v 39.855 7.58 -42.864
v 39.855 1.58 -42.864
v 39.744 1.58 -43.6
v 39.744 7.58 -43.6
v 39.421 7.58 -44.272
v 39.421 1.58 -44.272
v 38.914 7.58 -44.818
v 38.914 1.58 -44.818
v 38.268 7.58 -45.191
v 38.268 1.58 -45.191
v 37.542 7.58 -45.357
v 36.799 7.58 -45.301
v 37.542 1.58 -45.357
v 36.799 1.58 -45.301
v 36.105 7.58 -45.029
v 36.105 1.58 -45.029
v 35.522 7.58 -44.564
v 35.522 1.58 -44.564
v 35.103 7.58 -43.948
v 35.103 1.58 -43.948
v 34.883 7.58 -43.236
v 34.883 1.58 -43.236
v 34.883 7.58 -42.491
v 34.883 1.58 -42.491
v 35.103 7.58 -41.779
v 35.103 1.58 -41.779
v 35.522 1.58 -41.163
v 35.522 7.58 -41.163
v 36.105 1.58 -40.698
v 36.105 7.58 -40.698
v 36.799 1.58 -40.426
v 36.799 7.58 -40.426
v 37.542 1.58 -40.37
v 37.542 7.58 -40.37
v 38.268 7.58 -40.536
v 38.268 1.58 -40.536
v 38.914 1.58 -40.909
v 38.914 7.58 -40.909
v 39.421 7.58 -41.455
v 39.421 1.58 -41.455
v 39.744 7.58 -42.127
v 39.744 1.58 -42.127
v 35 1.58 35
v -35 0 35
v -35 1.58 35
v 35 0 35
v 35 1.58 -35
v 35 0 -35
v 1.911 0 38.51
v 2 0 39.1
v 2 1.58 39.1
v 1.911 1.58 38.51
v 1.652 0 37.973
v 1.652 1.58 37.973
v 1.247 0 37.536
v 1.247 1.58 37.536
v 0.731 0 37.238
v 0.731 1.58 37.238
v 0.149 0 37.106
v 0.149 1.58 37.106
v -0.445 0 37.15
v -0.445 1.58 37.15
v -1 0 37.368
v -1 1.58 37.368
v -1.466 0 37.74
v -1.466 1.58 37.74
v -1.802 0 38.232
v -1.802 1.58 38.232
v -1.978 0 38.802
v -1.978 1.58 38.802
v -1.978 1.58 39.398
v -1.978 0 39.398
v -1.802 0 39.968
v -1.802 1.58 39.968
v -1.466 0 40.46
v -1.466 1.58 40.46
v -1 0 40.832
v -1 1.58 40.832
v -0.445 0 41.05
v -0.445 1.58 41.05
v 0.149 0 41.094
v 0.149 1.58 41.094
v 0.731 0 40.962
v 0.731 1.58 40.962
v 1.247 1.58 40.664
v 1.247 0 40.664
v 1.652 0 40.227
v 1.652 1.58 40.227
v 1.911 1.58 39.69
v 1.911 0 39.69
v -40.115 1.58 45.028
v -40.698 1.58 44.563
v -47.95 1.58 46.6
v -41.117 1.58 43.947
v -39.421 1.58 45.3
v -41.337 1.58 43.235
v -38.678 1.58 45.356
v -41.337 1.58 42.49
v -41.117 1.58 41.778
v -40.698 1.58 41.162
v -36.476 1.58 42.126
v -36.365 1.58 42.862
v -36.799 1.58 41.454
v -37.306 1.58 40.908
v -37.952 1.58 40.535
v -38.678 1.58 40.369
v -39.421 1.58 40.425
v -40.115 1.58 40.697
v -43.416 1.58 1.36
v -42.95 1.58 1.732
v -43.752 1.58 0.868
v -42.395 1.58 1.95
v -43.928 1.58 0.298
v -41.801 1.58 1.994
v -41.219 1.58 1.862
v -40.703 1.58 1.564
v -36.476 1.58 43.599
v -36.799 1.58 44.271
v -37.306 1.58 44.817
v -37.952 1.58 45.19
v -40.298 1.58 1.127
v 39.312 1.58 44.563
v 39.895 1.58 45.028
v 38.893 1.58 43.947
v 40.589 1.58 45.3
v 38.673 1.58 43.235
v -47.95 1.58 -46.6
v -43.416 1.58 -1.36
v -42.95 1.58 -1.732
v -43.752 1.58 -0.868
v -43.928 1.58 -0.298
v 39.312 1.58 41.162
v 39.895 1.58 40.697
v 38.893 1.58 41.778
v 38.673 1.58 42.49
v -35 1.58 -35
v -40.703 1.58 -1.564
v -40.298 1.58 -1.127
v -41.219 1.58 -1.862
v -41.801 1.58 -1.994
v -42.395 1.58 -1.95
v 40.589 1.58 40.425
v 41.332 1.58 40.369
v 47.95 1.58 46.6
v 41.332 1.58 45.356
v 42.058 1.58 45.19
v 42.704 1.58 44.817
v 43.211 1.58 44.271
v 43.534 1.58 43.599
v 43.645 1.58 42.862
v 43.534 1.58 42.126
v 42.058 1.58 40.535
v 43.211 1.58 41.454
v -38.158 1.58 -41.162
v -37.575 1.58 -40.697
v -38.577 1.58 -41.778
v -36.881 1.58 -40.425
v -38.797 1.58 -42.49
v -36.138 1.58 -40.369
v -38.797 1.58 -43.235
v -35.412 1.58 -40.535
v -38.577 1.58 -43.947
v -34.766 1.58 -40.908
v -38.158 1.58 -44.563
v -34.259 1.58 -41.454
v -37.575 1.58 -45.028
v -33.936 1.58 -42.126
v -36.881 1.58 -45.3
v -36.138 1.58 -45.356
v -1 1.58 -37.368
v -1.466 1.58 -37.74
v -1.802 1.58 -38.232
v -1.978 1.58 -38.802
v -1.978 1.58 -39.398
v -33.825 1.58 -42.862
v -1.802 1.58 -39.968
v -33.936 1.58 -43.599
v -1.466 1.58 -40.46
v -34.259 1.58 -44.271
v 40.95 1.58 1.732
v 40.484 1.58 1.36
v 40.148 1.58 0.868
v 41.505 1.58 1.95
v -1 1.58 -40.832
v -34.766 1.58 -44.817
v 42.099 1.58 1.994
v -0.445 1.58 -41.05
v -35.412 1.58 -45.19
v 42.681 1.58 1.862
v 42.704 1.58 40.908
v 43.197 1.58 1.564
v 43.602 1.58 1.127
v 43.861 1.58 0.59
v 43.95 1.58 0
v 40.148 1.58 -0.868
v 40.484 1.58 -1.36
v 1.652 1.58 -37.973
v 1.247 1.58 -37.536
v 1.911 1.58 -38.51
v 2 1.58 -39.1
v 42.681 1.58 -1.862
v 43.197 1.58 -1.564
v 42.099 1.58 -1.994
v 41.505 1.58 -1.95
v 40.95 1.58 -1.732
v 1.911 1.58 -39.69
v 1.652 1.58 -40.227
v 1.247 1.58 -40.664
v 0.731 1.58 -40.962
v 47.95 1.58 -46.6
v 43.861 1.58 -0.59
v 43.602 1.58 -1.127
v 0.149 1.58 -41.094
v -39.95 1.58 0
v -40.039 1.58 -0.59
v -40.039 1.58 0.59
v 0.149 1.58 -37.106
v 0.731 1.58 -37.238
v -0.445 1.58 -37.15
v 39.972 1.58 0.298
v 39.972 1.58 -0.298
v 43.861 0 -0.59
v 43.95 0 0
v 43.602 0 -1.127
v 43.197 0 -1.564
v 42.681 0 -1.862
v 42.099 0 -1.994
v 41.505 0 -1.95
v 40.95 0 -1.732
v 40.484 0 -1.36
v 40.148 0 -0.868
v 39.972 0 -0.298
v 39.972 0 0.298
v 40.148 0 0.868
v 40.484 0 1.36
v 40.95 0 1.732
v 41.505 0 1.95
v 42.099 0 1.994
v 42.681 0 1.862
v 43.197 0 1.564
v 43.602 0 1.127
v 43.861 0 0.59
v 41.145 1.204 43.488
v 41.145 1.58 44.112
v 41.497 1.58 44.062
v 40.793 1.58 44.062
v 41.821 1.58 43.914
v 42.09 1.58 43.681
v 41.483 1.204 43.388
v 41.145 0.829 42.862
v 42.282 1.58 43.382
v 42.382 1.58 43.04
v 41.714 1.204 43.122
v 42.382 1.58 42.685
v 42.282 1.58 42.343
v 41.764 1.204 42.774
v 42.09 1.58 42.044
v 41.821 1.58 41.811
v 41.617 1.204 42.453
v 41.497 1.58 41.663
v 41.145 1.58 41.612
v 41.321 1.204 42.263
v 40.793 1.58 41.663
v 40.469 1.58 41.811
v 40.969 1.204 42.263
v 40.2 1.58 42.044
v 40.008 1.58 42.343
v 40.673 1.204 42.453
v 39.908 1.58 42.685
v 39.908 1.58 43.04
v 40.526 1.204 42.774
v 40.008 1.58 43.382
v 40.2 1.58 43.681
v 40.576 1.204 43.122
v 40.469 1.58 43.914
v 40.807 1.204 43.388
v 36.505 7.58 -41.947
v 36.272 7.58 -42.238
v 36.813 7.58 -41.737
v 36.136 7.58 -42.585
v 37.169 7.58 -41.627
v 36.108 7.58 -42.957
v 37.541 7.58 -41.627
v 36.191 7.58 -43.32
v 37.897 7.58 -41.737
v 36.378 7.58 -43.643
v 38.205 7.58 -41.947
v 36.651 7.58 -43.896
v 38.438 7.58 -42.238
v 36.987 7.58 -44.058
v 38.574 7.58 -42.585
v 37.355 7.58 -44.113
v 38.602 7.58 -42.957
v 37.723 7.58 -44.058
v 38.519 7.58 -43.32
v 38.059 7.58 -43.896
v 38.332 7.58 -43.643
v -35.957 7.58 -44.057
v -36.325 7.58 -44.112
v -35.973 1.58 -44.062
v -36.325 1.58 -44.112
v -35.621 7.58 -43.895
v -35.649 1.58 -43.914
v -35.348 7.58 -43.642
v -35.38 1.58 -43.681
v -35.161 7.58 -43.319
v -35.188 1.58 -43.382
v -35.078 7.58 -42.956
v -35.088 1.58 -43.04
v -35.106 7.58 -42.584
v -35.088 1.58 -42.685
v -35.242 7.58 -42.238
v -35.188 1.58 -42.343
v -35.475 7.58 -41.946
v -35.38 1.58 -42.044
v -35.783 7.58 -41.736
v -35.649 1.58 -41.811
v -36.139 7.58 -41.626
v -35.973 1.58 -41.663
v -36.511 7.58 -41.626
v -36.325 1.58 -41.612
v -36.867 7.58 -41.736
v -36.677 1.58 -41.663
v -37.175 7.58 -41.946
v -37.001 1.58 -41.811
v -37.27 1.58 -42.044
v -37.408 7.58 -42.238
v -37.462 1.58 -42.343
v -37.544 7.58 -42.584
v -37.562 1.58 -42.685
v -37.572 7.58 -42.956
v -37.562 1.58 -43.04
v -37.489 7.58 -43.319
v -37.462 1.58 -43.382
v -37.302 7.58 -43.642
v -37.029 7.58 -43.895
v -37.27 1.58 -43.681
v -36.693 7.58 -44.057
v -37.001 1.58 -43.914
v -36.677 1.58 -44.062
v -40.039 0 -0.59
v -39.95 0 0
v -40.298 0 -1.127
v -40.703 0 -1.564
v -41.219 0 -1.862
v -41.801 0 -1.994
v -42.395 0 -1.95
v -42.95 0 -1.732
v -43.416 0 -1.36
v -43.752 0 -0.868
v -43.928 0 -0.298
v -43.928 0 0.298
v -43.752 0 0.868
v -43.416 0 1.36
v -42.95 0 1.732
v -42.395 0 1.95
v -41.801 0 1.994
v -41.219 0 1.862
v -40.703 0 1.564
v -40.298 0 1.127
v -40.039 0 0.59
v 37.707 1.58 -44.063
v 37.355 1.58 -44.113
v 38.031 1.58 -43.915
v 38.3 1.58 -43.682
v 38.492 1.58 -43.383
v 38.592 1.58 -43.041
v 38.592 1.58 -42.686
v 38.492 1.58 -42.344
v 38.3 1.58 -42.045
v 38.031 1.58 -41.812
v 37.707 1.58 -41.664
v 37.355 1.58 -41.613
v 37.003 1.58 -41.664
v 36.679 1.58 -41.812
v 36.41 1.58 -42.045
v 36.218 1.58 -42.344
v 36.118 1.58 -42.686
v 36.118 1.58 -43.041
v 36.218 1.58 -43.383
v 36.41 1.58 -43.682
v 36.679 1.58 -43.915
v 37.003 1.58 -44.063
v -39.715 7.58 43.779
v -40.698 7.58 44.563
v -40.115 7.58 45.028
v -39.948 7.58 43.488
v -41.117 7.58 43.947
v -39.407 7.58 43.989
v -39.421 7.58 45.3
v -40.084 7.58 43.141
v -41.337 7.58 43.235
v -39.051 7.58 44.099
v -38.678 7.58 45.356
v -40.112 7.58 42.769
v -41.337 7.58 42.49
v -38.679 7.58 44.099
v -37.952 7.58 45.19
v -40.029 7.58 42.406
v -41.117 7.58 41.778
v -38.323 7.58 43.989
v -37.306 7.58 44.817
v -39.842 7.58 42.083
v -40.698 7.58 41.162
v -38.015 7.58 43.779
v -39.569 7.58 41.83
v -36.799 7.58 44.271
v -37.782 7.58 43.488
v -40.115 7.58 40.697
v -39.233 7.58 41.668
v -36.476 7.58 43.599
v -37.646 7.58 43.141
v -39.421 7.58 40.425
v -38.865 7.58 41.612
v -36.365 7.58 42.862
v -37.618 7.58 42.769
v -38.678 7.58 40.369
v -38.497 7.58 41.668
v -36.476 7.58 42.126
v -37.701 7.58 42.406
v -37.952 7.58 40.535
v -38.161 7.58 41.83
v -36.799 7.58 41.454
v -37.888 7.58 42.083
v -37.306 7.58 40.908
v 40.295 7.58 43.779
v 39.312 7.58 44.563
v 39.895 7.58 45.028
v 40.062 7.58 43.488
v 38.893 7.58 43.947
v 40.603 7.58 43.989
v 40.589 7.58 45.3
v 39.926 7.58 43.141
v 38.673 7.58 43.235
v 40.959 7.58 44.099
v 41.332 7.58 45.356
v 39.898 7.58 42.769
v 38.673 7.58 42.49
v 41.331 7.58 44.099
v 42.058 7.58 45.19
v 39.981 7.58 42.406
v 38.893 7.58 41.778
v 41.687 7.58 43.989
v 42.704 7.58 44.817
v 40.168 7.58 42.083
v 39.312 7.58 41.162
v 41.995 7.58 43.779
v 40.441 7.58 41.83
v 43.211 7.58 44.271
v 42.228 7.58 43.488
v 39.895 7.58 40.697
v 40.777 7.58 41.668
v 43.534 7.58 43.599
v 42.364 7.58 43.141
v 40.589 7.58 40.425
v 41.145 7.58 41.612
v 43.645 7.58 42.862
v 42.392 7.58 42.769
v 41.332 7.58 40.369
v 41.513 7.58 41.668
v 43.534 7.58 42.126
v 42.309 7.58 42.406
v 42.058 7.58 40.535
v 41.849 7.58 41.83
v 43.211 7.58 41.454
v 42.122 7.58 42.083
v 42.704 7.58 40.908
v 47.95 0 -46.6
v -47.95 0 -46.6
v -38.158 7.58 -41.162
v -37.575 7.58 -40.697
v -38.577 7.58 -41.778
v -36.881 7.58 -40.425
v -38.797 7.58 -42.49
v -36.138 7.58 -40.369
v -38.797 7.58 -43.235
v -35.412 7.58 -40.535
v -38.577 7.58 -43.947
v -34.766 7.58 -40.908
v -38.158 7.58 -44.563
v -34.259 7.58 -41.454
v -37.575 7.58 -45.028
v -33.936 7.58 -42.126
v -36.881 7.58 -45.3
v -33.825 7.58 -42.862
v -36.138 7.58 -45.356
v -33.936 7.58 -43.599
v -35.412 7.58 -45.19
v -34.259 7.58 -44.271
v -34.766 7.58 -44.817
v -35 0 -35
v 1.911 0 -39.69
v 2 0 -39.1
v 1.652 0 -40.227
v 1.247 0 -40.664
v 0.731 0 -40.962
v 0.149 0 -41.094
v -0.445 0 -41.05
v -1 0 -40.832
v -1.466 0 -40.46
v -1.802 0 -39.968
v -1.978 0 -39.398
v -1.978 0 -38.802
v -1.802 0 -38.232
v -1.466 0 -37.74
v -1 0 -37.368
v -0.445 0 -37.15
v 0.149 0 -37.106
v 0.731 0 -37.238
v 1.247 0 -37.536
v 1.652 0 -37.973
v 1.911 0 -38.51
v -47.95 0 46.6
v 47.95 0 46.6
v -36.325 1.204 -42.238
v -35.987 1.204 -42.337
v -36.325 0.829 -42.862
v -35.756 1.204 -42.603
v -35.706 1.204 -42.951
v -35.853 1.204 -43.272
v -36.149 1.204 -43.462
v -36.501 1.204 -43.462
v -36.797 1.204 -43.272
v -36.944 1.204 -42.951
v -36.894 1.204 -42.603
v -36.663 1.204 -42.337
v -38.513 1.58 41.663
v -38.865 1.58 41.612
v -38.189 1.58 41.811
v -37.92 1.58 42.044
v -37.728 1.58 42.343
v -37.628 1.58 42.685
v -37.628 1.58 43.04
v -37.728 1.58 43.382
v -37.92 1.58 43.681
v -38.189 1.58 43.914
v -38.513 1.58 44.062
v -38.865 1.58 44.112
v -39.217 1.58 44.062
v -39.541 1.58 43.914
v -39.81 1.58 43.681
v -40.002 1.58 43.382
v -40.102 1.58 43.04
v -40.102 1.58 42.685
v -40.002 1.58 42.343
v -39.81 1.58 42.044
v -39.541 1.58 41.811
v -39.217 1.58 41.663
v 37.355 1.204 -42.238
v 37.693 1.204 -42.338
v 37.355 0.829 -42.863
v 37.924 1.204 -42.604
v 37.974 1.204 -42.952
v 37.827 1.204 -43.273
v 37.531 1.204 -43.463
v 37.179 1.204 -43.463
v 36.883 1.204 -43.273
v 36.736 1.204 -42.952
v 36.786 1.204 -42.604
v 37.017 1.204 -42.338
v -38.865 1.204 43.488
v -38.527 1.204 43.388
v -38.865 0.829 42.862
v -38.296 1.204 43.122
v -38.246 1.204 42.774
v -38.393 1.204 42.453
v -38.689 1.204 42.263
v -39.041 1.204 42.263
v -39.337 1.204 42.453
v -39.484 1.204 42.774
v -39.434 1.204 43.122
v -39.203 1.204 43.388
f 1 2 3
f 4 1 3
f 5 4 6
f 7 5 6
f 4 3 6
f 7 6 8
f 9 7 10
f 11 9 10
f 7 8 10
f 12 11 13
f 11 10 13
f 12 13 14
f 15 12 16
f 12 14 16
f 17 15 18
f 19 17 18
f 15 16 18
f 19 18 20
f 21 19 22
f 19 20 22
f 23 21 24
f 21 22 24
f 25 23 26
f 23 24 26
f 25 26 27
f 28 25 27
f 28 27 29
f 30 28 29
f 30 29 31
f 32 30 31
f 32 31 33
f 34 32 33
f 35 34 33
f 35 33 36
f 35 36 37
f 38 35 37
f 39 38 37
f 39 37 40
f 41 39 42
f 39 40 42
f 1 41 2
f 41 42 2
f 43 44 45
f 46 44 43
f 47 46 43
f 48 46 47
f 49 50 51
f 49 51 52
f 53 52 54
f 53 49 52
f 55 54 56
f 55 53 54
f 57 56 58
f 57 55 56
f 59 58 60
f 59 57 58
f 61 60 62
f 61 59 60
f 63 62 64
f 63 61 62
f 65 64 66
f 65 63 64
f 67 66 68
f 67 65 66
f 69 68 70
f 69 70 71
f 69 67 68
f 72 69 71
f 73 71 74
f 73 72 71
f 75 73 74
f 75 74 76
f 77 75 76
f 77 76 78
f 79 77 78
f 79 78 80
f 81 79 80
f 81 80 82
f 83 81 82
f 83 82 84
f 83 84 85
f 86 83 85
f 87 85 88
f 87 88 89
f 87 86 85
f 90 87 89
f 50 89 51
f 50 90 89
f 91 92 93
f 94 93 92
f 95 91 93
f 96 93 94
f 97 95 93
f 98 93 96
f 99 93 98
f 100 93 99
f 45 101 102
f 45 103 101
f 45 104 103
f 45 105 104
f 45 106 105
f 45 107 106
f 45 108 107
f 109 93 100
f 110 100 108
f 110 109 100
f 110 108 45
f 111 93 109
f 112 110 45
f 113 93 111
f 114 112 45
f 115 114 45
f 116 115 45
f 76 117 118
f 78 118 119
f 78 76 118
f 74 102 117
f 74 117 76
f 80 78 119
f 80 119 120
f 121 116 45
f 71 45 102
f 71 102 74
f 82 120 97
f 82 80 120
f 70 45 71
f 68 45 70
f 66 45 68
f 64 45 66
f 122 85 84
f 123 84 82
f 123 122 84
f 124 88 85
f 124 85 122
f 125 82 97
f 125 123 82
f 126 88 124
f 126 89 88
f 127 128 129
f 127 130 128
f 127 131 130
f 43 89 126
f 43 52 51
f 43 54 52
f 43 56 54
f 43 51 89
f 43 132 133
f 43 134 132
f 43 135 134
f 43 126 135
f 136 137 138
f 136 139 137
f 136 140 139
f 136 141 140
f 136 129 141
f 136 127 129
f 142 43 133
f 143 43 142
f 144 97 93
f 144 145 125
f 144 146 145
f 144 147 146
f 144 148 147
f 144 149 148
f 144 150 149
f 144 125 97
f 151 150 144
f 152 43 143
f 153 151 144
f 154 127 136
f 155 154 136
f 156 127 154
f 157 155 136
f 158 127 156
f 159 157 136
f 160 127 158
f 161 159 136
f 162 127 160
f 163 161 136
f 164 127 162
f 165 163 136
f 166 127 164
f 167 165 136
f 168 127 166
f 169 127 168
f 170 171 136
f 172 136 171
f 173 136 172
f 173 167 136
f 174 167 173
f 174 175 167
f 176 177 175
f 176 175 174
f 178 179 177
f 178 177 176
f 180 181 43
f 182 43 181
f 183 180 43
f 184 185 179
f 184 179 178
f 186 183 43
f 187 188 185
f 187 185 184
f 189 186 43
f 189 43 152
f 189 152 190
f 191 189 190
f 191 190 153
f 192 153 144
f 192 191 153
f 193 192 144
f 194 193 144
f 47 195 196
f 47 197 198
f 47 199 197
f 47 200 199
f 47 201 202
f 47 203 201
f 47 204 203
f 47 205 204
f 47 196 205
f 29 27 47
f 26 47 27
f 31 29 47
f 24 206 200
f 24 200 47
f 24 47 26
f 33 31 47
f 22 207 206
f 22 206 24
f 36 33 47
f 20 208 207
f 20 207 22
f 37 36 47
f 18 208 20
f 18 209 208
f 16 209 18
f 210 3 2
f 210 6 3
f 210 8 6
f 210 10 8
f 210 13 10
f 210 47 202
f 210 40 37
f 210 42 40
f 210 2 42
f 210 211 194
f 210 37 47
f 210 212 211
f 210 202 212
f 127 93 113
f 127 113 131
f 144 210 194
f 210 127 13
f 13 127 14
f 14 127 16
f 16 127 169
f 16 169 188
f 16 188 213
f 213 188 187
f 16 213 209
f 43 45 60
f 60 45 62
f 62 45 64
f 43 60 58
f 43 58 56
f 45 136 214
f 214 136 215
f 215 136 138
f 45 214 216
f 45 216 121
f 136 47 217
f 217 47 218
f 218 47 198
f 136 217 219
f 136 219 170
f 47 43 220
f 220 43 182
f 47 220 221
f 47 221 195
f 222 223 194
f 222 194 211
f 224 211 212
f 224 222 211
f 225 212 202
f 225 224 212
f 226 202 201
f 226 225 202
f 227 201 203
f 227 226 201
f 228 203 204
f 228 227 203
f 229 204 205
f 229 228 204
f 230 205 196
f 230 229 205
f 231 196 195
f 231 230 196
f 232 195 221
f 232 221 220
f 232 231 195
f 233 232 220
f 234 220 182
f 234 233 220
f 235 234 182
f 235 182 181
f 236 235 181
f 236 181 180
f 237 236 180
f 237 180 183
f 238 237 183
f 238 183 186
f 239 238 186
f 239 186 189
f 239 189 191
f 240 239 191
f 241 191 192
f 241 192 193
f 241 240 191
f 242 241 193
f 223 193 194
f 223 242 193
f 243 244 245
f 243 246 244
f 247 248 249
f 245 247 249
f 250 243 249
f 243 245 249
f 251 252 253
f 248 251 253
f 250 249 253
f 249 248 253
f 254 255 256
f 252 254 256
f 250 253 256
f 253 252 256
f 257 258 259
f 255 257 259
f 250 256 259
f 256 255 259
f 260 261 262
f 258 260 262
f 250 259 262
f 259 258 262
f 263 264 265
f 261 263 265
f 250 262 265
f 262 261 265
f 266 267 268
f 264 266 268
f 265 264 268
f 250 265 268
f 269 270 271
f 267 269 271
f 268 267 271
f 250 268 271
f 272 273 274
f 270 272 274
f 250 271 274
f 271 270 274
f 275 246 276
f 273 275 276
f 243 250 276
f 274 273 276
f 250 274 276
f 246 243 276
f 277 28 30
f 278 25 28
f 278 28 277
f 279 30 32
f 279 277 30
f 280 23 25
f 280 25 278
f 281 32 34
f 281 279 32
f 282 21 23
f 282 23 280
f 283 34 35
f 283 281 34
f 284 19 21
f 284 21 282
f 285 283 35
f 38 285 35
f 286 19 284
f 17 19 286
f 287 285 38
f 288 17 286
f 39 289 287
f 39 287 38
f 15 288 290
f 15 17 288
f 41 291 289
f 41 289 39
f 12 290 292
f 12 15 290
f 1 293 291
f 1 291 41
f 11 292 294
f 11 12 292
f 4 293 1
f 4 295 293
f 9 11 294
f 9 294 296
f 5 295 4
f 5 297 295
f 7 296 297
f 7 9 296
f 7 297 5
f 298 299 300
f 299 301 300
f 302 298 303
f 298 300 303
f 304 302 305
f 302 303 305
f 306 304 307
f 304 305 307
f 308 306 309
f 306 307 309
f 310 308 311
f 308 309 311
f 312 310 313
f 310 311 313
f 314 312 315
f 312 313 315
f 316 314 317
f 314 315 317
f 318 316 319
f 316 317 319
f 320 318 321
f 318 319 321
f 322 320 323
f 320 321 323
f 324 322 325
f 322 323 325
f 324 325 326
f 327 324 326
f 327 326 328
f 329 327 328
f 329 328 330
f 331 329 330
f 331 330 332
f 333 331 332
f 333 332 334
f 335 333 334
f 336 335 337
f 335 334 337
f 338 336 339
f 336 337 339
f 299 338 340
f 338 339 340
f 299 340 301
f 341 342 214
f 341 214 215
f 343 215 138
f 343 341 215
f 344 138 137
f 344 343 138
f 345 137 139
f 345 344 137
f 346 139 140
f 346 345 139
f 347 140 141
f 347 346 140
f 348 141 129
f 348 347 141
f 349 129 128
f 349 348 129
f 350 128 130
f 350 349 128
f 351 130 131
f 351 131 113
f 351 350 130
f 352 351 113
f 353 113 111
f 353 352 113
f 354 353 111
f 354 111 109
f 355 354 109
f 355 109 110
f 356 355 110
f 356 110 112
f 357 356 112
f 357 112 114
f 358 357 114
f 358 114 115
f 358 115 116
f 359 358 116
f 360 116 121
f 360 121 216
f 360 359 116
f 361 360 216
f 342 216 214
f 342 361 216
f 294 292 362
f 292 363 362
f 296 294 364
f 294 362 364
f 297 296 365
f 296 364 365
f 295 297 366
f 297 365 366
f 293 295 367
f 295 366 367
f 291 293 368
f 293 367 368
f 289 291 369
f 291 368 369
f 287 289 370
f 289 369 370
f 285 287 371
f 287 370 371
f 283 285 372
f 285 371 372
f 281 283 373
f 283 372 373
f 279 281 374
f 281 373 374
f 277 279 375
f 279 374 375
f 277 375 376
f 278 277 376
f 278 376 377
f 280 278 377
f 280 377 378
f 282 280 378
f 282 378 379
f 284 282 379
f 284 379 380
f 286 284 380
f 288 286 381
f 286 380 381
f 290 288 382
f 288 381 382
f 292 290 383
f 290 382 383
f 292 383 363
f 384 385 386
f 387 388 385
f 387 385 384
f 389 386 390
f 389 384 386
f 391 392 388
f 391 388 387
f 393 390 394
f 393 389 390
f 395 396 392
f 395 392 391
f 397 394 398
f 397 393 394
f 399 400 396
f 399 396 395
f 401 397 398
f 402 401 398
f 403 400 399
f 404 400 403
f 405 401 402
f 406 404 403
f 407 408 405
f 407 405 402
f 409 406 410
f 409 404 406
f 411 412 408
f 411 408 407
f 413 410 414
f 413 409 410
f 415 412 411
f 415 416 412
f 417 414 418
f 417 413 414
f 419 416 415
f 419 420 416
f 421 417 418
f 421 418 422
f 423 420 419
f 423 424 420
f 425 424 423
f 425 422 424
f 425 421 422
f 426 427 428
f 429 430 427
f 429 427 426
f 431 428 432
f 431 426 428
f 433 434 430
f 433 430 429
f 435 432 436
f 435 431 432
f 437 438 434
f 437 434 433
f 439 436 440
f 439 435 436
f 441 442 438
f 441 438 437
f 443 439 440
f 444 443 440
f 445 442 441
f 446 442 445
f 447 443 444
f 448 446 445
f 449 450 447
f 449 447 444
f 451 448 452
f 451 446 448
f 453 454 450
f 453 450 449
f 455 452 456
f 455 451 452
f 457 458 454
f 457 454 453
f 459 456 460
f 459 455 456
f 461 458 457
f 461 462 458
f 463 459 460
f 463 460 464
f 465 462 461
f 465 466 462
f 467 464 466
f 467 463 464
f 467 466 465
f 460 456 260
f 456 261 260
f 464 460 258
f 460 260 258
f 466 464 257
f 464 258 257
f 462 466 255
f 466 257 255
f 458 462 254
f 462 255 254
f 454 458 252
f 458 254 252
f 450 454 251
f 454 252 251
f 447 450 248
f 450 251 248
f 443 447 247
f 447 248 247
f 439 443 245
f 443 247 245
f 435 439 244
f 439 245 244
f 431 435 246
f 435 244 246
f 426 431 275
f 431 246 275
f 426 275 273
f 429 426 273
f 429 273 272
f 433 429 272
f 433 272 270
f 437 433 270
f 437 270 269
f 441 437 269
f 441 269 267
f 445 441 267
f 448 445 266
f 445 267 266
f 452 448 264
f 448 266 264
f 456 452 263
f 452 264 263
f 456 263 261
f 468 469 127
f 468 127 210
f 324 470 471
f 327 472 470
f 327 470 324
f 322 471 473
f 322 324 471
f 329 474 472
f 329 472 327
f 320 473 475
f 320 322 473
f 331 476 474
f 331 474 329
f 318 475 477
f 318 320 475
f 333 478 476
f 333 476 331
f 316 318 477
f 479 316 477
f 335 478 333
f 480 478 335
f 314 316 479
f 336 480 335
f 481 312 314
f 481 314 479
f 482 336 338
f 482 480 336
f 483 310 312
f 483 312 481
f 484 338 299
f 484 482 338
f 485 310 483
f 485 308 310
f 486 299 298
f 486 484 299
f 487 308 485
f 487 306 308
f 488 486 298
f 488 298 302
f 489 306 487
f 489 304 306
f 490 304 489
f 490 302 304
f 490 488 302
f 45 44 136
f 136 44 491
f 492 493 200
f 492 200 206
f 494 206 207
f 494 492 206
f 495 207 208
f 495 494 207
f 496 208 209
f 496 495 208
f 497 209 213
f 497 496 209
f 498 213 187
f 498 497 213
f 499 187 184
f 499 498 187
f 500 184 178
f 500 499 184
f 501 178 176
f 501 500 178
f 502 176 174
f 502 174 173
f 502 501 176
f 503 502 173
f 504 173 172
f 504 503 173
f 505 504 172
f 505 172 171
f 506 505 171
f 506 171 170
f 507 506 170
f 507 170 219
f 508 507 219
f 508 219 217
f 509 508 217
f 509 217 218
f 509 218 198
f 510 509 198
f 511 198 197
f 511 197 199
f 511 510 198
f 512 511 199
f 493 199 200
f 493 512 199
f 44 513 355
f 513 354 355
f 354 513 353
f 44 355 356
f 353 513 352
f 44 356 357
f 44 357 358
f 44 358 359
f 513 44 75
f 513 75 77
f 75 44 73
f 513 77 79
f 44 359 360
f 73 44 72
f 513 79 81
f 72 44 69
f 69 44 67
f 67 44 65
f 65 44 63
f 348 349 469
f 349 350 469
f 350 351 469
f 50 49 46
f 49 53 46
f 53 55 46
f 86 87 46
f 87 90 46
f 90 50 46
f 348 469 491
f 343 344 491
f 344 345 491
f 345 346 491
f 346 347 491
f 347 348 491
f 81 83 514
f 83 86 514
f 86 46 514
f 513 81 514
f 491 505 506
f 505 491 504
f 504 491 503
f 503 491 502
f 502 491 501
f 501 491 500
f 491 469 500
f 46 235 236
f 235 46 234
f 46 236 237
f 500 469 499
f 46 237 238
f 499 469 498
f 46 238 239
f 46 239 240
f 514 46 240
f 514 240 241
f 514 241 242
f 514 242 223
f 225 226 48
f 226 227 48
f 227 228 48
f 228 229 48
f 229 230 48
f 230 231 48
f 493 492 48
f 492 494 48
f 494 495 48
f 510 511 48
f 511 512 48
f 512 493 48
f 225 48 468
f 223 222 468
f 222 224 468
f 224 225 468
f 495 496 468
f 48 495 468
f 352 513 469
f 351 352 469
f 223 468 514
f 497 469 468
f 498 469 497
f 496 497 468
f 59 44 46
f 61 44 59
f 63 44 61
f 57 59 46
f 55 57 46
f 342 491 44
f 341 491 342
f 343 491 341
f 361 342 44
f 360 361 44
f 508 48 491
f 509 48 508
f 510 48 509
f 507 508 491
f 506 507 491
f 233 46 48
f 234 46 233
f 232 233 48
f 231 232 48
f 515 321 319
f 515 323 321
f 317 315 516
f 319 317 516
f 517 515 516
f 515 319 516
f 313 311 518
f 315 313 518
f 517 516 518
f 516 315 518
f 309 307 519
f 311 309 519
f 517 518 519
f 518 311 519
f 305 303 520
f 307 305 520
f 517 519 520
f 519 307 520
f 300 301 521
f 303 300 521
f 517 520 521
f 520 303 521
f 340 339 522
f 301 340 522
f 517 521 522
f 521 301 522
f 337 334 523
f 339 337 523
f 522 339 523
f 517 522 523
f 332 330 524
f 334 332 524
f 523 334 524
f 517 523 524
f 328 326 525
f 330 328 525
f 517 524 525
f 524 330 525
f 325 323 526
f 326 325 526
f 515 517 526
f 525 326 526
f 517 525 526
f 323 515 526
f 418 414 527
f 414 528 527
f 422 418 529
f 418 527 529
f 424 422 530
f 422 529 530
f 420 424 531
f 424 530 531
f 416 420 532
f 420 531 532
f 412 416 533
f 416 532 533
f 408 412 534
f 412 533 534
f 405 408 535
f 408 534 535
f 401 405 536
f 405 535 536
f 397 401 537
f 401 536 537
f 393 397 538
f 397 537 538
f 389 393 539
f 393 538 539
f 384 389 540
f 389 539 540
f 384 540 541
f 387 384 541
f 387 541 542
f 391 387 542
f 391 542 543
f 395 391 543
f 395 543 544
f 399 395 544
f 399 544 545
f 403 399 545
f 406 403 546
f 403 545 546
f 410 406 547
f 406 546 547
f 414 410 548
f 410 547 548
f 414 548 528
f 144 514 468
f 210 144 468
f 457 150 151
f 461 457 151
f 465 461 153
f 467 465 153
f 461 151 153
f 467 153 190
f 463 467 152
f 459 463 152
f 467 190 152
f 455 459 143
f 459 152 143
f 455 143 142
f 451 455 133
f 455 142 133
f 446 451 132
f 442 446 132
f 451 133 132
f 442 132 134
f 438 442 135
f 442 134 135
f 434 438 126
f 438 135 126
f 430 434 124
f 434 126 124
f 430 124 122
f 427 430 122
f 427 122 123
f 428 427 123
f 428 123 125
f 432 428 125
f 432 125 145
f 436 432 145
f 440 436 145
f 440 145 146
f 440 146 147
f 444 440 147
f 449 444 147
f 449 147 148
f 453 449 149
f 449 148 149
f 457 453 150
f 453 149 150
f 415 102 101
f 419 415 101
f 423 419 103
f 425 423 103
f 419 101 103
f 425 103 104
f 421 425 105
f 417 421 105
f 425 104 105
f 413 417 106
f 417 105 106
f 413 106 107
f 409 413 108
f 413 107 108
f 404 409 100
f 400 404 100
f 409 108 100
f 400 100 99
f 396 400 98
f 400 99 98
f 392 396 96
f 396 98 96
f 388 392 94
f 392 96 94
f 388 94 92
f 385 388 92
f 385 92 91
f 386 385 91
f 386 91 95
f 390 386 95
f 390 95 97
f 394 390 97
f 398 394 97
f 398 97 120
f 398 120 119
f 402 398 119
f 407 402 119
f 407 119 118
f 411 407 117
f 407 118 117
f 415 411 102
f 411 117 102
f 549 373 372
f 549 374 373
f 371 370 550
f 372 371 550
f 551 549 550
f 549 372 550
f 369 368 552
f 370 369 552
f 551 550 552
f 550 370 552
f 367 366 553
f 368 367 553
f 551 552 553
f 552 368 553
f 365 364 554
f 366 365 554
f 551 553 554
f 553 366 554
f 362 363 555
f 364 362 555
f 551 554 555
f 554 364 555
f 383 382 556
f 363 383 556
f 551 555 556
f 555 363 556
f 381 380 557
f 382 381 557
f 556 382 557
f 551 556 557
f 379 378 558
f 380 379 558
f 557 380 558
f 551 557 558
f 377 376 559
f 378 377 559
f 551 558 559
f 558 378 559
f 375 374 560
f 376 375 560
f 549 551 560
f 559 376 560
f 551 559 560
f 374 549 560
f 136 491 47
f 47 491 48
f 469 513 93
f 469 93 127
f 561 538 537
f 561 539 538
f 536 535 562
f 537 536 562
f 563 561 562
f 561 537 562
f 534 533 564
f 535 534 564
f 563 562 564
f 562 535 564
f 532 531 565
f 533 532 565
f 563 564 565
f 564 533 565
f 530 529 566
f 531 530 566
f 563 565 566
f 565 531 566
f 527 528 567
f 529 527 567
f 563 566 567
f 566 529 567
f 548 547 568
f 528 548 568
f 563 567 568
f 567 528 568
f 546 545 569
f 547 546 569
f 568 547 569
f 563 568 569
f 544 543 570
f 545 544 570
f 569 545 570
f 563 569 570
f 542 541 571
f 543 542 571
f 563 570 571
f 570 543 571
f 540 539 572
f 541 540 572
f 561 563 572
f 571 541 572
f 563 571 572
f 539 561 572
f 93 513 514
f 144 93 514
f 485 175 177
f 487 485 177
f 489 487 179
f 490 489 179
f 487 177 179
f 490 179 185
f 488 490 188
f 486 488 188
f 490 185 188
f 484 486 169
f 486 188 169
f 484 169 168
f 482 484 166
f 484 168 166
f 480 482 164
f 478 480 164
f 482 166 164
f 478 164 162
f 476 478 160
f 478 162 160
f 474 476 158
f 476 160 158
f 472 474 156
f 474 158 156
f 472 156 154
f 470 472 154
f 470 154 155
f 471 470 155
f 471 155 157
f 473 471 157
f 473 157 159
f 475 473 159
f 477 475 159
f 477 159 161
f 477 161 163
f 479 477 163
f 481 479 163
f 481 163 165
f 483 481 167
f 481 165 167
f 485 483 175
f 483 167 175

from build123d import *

# Parameters (mm, degrees)
SKETCH1_W                 = 95.9
SKETCH1_H                 = 93.2
SKETCH1_R                 = 2
SKETCH1_W_2               = 70
SKETCH1_H_2               = 70
BOSS_EXTRUDE1_DEPTH       = 1.58
SKETCH2_R                 = 2.5
BOSS_EXTRUDE2_DEPTH       = 6
M3X0_5_TAPPED_HOLE2_D     = 2.5
M3X0_5_TAPPED_HOLE2_DEPTH = 6
M3X0_5_TAPPED_HOLE2_TIP   = 0.751075774


with BuildPart() as part:
    # Sketch1 → Boss-Extrude1 (new body)
    with BuildSketch(Plane(origin=(0, 0, 0), x_dir=(1, 0, 0), z_dir=(0, 1, 0))):
        Rectangle(SKETCH1_W, SKETCH1_H)
        with Locations((0, 39.1)):
            Circle(SKETCH1_R, mode=Mode.SUBTRACT)
        with Locations((41.95, 0)):
            Circle(SKETCH1_R, mode=Mode.SUBTRACT)
        with Locations((0, -39.1)):
            Circle(SKETCH1_R, mode=Mode.SUBTRACT)
        with Locations((-41.95, 0)):
            Circle(SKETCH1_R, mode=Mode.SUBTRACT)
        Rectangle(SKETCH1_W_2, SKETCH1_H_2, mode=Mode.SUBTRACT)
    extrude(amount=BOSS_EXTRUDE1_DEPTH)

    # Sketch2 → Boss-Extrude2 (add)
    with BuildSketch(Plane(origin=(0, 1.58, 0), x_dir=(1, 0, 0), z_dir=(0, 1, 0))):
        with Locations((37.355, 42.8635)):
            Circle(SKETCH2_R)
        with Locations((-36.325, 42.8625)):
            Circle(SKETCH2_R)
        with Locations((-38.865, -42.8625)):
            Circle(SKETCH2_R)
        with Locations((41.145, -42.8625)):
            Circle(SKETCH2_R)
    extrude(amount=BOSS_EXTRUDE2_DEPTH)

    # M3x0.5 Tapped Hole2
    with Locations(Plane(origin=(-36.325, 7.58, -42.8625), x_dir=(0, 0, 1), z_dir=(0, 1, 0))):
        with Locations((0, 0), (85.725, -2.54), (85.725, 77.47), (-0.001, 73.68)):
            Hole(M3X0_5_TAPPED_HOLE2_D / 2, depth=M3X0_5_TAPPED_HOLE2_DEPTH)
            with Locations((0, 0, -(M3X0_5_TAPPED_HOLE2_DEPTH + M3X0_5_TAPPED_HOLE2_TIP / 2))):  # 118° drill point
                Cone(0, M3X0_5_TAPPED_HOLE2_D / 2, M3X0_5_TAPPED_HOLE2_TIP, mode=Mode.SUBTRACT)


solid = part.part
